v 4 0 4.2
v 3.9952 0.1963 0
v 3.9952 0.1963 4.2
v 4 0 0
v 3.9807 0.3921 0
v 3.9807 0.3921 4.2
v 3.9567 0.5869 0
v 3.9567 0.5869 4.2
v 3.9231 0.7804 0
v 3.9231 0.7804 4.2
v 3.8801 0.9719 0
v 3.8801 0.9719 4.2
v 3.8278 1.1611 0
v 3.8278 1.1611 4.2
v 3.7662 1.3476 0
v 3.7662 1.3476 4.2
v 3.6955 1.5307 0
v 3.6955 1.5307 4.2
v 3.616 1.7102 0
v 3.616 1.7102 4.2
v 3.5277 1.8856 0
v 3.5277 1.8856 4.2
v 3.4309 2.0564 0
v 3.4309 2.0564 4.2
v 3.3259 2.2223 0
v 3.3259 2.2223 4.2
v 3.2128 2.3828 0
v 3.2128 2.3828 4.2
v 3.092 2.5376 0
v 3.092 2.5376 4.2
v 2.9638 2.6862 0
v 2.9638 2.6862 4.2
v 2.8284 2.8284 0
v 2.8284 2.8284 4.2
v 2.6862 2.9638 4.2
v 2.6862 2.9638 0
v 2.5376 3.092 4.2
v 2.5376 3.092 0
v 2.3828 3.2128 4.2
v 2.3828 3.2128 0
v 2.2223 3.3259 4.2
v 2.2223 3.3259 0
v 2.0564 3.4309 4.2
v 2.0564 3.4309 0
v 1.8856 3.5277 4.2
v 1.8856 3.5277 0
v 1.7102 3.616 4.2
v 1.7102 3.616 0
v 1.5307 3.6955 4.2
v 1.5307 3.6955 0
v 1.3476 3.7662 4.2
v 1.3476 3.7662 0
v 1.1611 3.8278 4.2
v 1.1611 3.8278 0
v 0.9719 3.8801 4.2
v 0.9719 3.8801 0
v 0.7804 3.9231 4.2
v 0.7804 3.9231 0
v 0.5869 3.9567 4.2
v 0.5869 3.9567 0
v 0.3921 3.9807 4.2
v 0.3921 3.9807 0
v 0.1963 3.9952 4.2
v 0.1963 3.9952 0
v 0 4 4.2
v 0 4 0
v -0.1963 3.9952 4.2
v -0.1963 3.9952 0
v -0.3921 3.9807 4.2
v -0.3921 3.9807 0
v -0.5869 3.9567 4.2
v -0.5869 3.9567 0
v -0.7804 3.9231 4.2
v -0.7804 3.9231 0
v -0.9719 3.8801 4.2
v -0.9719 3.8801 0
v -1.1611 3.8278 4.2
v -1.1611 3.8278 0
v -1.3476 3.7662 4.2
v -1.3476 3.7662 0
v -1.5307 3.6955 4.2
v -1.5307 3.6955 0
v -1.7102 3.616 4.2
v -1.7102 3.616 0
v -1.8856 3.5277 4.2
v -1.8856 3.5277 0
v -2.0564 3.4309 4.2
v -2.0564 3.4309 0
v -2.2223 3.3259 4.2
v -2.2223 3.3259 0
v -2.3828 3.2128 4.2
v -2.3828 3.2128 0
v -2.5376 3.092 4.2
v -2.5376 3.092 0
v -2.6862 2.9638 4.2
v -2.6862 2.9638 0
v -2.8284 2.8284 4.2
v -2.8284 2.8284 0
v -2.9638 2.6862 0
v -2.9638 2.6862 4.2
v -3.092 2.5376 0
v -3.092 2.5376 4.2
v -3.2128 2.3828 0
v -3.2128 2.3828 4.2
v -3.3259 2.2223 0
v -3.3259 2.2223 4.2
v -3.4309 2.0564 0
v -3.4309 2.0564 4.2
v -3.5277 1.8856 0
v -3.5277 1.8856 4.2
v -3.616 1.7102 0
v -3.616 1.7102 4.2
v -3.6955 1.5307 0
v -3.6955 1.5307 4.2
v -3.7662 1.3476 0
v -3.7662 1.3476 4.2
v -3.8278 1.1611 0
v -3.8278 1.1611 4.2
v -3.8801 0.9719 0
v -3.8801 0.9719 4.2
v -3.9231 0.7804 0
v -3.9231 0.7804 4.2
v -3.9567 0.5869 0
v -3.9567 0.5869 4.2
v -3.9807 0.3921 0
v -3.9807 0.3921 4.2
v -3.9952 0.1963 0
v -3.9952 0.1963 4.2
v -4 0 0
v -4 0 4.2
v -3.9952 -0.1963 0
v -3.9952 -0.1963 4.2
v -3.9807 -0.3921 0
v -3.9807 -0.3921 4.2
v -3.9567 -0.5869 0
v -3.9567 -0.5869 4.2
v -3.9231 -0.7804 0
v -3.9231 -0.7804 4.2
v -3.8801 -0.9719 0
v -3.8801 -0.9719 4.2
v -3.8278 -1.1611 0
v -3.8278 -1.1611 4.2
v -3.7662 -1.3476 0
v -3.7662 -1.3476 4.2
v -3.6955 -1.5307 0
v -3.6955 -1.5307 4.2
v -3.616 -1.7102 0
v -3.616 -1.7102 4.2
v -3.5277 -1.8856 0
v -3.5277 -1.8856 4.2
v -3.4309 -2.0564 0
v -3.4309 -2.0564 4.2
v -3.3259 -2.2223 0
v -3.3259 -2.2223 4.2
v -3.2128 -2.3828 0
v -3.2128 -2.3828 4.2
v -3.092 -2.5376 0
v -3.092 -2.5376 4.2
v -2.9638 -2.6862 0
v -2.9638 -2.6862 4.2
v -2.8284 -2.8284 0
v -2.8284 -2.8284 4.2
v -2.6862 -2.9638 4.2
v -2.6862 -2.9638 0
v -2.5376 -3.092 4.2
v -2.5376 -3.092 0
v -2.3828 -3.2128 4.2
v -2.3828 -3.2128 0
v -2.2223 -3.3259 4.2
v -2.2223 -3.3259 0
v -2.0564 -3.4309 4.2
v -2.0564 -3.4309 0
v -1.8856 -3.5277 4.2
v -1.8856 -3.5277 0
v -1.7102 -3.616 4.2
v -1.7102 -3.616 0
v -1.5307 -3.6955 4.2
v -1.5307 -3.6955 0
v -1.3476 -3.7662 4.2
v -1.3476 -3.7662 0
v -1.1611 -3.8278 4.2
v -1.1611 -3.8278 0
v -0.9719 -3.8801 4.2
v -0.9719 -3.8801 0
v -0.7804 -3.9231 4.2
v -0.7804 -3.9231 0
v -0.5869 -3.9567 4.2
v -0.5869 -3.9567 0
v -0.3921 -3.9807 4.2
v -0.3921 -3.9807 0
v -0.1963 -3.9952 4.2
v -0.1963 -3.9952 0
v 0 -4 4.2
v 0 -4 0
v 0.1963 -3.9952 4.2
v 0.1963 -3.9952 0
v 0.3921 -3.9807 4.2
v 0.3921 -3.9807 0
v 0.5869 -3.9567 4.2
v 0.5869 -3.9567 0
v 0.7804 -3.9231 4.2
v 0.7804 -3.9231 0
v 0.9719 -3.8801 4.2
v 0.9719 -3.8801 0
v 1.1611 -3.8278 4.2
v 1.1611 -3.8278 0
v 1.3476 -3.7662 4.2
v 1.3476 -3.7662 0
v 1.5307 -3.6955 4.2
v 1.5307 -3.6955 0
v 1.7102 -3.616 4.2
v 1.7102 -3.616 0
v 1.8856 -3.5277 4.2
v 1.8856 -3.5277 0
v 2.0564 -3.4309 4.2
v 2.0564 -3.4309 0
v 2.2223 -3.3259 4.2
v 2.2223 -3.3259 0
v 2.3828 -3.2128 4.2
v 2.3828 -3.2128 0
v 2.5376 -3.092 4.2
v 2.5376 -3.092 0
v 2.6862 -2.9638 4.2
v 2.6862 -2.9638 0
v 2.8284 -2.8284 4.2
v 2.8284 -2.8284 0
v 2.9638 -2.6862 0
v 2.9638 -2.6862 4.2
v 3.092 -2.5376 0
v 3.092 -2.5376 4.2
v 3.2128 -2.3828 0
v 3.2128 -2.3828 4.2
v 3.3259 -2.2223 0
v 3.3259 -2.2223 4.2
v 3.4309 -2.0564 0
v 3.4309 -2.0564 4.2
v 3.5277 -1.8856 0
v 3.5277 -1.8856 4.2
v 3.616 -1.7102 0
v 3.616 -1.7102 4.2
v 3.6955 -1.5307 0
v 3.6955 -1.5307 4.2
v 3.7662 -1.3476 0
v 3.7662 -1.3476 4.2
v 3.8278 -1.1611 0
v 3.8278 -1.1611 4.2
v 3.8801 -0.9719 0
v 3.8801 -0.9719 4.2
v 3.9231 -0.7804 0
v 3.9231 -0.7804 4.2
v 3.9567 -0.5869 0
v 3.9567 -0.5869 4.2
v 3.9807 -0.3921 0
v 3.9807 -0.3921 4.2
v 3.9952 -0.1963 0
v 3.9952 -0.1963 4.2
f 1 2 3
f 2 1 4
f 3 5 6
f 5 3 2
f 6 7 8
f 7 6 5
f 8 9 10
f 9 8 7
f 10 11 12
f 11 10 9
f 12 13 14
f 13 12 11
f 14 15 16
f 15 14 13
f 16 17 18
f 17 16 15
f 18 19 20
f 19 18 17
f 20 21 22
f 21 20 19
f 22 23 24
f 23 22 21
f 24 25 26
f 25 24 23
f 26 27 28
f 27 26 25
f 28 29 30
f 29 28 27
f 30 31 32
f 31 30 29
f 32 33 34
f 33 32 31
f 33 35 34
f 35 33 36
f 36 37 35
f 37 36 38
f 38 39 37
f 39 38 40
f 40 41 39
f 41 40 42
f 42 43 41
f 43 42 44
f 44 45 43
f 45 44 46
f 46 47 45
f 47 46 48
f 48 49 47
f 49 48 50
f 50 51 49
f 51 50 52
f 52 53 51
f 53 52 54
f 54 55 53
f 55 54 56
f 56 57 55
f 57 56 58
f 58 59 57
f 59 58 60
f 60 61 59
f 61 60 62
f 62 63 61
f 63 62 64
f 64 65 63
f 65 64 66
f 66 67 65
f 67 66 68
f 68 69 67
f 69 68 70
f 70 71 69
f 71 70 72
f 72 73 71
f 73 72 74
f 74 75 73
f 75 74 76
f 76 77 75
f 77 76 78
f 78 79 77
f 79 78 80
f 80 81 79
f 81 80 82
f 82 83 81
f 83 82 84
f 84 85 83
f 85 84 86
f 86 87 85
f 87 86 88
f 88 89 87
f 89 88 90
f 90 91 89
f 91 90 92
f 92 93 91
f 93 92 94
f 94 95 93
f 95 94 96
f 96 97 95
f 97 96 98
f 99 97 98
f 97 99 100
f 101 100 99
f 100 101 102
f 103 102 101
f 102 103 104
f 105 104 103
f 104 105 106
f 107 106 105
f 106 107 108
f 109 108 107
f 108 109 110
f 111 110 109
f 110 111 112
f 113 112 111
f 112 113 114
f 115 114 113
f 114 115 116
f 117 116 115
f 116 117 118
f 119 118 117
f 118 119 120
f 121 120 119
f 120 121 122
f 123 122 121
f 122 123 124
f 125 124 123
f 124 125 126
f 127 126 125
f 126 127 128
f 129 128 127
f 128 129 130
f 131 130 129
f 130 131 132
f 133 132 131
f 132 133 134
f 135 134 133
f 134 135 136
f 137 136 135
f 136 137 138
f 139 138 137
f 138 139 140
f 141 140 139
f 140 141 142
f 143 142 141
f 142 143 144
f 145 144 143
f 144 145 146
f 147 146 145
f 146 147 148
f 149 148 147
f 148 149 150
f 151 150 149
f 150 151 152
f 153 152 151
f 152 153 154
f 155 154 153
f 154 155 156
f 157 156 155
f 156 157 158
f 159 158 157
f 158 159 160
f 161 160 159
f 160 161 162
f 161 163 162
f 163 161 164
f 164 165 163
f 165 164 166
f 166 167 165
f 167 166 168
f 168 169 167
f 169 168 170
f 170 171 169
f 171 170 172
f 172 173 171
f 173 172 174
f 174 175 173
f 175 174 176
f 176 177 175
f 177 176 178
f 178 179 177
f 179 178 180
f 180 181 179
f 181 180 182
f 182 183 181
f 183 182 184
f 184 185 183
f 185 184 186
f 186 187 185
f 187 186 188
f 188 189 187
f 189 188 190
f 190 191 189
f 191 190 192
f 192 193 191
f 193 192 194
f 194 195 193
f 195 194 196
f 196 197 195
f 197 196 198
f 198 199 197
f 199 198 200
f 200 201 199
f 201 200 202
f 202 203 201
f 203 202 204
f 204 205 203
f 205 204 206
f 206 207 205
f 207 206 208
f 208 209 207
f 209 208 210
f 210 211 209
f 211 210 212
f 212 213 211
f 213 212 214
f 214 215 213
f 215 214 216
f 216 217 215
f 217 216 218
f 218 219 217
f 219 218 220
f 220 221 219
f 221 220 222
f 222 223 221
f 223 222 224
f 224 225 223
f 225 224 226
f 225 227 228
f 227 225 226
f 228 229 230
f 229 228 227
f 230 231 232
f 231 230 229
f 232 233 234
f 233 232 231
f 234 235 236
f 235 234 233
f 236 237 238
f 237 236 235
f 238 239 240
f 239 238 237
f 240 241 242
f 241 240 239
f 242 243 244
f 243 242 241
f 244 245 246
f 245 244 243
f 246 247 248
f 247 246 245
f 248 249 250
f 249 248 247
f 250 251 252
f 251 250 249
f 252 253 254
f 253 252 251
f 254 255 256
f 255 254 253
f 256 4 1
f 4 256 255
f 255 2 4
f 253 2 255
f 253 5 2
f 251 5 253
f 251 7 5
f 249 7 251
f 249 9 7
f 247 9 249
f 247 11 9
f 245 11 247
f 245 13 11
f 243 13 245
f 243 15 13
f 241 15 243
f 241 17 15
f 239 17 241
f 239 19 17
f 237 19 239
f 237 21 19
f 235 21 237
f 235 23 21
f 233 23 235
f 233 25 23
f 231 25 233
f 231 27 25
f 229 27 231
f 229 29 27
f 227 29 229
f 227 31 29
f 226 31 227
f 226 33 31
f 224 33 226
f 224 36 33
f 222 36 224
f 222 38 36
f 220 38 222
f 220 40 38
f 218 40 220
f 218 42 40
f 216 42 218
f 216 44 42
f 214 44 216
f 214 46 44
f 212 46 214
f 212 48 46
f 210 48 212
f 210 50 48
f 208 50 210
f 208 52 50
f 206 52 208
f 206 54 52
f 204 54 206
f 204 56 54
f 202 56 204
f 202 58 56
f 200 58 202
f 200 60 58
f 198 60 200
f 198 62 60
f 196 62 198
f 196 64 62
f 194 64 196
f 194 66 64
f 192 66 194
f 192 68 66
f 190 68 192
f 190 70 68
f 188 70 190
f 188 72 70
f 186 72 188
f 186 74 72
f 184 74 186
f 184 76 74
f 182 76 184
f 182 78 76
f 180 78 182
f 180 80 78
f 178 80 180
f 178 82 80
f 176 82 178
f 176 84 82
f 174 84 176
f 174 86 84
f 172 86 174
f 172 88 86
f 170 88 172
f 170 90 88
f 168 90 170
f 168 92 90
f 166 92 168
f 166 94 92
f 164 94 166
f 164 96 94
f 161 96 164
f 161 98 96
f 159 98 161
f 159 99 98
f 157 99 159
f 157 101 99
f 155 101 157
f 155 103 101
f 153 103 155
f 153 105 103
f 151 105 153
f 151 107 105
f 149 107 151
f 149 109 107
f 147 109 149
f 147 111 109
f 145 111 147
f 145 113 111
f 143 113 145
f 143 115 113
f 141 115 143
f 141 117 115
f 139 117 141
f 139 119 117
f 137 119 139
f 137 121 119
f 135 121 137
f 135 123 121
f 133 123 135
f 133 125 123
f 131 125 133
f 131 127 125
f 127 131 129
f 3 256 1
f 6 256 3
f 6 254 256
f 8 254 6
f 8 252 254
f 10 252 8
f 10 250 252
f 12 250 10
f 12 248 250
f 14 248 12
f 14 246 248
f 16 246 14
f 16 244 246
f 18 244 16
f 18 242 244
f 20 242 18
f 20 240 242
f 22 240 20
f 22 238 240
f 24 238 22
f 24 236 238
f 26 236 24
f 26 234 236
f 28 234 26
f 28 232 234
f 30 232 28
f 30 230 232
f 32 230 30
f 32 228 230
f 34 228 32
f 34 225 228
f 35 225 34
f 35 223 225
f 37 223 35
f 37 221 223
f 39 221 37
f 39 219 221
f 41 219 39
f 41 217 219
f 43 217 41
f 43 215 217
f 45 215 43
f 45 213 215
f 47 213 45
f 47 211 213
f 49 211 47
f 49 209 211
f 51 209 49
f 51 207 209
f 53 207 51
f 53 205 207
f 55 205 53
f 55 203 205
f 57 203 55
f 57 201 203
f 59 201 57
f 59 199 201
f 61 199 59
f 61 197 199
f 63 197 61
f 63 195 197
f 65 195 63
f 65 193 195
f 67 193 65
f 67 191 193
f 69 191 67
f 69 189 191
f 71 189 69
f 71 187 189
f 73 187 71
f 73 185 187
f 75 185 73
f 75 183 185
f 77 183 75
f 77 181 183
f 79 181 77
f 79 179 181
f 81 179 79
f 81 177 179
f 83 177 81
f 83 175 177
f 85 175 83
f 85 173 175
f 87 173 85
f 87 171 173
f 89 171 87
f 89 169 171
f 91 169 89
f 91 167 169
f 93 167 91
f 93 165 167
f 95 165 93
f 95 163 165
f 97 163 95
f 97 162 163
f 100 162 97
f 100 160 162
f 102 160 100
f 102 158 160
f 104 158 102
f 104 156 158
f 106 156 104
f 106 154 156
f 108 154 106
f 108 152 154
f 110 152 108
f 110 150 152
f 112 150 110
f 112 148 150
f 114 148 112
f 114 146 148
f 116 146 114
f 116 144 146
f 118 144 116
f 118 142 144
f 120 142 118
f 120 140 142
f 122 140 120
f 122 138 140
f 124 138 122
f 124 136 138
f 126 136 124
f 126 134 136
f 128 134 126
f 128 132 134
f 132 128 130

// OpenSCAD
$fn = 128;

diameter = 8.0;
height = 4.2;

cylinder(d=diameter, h=height, center=false);
